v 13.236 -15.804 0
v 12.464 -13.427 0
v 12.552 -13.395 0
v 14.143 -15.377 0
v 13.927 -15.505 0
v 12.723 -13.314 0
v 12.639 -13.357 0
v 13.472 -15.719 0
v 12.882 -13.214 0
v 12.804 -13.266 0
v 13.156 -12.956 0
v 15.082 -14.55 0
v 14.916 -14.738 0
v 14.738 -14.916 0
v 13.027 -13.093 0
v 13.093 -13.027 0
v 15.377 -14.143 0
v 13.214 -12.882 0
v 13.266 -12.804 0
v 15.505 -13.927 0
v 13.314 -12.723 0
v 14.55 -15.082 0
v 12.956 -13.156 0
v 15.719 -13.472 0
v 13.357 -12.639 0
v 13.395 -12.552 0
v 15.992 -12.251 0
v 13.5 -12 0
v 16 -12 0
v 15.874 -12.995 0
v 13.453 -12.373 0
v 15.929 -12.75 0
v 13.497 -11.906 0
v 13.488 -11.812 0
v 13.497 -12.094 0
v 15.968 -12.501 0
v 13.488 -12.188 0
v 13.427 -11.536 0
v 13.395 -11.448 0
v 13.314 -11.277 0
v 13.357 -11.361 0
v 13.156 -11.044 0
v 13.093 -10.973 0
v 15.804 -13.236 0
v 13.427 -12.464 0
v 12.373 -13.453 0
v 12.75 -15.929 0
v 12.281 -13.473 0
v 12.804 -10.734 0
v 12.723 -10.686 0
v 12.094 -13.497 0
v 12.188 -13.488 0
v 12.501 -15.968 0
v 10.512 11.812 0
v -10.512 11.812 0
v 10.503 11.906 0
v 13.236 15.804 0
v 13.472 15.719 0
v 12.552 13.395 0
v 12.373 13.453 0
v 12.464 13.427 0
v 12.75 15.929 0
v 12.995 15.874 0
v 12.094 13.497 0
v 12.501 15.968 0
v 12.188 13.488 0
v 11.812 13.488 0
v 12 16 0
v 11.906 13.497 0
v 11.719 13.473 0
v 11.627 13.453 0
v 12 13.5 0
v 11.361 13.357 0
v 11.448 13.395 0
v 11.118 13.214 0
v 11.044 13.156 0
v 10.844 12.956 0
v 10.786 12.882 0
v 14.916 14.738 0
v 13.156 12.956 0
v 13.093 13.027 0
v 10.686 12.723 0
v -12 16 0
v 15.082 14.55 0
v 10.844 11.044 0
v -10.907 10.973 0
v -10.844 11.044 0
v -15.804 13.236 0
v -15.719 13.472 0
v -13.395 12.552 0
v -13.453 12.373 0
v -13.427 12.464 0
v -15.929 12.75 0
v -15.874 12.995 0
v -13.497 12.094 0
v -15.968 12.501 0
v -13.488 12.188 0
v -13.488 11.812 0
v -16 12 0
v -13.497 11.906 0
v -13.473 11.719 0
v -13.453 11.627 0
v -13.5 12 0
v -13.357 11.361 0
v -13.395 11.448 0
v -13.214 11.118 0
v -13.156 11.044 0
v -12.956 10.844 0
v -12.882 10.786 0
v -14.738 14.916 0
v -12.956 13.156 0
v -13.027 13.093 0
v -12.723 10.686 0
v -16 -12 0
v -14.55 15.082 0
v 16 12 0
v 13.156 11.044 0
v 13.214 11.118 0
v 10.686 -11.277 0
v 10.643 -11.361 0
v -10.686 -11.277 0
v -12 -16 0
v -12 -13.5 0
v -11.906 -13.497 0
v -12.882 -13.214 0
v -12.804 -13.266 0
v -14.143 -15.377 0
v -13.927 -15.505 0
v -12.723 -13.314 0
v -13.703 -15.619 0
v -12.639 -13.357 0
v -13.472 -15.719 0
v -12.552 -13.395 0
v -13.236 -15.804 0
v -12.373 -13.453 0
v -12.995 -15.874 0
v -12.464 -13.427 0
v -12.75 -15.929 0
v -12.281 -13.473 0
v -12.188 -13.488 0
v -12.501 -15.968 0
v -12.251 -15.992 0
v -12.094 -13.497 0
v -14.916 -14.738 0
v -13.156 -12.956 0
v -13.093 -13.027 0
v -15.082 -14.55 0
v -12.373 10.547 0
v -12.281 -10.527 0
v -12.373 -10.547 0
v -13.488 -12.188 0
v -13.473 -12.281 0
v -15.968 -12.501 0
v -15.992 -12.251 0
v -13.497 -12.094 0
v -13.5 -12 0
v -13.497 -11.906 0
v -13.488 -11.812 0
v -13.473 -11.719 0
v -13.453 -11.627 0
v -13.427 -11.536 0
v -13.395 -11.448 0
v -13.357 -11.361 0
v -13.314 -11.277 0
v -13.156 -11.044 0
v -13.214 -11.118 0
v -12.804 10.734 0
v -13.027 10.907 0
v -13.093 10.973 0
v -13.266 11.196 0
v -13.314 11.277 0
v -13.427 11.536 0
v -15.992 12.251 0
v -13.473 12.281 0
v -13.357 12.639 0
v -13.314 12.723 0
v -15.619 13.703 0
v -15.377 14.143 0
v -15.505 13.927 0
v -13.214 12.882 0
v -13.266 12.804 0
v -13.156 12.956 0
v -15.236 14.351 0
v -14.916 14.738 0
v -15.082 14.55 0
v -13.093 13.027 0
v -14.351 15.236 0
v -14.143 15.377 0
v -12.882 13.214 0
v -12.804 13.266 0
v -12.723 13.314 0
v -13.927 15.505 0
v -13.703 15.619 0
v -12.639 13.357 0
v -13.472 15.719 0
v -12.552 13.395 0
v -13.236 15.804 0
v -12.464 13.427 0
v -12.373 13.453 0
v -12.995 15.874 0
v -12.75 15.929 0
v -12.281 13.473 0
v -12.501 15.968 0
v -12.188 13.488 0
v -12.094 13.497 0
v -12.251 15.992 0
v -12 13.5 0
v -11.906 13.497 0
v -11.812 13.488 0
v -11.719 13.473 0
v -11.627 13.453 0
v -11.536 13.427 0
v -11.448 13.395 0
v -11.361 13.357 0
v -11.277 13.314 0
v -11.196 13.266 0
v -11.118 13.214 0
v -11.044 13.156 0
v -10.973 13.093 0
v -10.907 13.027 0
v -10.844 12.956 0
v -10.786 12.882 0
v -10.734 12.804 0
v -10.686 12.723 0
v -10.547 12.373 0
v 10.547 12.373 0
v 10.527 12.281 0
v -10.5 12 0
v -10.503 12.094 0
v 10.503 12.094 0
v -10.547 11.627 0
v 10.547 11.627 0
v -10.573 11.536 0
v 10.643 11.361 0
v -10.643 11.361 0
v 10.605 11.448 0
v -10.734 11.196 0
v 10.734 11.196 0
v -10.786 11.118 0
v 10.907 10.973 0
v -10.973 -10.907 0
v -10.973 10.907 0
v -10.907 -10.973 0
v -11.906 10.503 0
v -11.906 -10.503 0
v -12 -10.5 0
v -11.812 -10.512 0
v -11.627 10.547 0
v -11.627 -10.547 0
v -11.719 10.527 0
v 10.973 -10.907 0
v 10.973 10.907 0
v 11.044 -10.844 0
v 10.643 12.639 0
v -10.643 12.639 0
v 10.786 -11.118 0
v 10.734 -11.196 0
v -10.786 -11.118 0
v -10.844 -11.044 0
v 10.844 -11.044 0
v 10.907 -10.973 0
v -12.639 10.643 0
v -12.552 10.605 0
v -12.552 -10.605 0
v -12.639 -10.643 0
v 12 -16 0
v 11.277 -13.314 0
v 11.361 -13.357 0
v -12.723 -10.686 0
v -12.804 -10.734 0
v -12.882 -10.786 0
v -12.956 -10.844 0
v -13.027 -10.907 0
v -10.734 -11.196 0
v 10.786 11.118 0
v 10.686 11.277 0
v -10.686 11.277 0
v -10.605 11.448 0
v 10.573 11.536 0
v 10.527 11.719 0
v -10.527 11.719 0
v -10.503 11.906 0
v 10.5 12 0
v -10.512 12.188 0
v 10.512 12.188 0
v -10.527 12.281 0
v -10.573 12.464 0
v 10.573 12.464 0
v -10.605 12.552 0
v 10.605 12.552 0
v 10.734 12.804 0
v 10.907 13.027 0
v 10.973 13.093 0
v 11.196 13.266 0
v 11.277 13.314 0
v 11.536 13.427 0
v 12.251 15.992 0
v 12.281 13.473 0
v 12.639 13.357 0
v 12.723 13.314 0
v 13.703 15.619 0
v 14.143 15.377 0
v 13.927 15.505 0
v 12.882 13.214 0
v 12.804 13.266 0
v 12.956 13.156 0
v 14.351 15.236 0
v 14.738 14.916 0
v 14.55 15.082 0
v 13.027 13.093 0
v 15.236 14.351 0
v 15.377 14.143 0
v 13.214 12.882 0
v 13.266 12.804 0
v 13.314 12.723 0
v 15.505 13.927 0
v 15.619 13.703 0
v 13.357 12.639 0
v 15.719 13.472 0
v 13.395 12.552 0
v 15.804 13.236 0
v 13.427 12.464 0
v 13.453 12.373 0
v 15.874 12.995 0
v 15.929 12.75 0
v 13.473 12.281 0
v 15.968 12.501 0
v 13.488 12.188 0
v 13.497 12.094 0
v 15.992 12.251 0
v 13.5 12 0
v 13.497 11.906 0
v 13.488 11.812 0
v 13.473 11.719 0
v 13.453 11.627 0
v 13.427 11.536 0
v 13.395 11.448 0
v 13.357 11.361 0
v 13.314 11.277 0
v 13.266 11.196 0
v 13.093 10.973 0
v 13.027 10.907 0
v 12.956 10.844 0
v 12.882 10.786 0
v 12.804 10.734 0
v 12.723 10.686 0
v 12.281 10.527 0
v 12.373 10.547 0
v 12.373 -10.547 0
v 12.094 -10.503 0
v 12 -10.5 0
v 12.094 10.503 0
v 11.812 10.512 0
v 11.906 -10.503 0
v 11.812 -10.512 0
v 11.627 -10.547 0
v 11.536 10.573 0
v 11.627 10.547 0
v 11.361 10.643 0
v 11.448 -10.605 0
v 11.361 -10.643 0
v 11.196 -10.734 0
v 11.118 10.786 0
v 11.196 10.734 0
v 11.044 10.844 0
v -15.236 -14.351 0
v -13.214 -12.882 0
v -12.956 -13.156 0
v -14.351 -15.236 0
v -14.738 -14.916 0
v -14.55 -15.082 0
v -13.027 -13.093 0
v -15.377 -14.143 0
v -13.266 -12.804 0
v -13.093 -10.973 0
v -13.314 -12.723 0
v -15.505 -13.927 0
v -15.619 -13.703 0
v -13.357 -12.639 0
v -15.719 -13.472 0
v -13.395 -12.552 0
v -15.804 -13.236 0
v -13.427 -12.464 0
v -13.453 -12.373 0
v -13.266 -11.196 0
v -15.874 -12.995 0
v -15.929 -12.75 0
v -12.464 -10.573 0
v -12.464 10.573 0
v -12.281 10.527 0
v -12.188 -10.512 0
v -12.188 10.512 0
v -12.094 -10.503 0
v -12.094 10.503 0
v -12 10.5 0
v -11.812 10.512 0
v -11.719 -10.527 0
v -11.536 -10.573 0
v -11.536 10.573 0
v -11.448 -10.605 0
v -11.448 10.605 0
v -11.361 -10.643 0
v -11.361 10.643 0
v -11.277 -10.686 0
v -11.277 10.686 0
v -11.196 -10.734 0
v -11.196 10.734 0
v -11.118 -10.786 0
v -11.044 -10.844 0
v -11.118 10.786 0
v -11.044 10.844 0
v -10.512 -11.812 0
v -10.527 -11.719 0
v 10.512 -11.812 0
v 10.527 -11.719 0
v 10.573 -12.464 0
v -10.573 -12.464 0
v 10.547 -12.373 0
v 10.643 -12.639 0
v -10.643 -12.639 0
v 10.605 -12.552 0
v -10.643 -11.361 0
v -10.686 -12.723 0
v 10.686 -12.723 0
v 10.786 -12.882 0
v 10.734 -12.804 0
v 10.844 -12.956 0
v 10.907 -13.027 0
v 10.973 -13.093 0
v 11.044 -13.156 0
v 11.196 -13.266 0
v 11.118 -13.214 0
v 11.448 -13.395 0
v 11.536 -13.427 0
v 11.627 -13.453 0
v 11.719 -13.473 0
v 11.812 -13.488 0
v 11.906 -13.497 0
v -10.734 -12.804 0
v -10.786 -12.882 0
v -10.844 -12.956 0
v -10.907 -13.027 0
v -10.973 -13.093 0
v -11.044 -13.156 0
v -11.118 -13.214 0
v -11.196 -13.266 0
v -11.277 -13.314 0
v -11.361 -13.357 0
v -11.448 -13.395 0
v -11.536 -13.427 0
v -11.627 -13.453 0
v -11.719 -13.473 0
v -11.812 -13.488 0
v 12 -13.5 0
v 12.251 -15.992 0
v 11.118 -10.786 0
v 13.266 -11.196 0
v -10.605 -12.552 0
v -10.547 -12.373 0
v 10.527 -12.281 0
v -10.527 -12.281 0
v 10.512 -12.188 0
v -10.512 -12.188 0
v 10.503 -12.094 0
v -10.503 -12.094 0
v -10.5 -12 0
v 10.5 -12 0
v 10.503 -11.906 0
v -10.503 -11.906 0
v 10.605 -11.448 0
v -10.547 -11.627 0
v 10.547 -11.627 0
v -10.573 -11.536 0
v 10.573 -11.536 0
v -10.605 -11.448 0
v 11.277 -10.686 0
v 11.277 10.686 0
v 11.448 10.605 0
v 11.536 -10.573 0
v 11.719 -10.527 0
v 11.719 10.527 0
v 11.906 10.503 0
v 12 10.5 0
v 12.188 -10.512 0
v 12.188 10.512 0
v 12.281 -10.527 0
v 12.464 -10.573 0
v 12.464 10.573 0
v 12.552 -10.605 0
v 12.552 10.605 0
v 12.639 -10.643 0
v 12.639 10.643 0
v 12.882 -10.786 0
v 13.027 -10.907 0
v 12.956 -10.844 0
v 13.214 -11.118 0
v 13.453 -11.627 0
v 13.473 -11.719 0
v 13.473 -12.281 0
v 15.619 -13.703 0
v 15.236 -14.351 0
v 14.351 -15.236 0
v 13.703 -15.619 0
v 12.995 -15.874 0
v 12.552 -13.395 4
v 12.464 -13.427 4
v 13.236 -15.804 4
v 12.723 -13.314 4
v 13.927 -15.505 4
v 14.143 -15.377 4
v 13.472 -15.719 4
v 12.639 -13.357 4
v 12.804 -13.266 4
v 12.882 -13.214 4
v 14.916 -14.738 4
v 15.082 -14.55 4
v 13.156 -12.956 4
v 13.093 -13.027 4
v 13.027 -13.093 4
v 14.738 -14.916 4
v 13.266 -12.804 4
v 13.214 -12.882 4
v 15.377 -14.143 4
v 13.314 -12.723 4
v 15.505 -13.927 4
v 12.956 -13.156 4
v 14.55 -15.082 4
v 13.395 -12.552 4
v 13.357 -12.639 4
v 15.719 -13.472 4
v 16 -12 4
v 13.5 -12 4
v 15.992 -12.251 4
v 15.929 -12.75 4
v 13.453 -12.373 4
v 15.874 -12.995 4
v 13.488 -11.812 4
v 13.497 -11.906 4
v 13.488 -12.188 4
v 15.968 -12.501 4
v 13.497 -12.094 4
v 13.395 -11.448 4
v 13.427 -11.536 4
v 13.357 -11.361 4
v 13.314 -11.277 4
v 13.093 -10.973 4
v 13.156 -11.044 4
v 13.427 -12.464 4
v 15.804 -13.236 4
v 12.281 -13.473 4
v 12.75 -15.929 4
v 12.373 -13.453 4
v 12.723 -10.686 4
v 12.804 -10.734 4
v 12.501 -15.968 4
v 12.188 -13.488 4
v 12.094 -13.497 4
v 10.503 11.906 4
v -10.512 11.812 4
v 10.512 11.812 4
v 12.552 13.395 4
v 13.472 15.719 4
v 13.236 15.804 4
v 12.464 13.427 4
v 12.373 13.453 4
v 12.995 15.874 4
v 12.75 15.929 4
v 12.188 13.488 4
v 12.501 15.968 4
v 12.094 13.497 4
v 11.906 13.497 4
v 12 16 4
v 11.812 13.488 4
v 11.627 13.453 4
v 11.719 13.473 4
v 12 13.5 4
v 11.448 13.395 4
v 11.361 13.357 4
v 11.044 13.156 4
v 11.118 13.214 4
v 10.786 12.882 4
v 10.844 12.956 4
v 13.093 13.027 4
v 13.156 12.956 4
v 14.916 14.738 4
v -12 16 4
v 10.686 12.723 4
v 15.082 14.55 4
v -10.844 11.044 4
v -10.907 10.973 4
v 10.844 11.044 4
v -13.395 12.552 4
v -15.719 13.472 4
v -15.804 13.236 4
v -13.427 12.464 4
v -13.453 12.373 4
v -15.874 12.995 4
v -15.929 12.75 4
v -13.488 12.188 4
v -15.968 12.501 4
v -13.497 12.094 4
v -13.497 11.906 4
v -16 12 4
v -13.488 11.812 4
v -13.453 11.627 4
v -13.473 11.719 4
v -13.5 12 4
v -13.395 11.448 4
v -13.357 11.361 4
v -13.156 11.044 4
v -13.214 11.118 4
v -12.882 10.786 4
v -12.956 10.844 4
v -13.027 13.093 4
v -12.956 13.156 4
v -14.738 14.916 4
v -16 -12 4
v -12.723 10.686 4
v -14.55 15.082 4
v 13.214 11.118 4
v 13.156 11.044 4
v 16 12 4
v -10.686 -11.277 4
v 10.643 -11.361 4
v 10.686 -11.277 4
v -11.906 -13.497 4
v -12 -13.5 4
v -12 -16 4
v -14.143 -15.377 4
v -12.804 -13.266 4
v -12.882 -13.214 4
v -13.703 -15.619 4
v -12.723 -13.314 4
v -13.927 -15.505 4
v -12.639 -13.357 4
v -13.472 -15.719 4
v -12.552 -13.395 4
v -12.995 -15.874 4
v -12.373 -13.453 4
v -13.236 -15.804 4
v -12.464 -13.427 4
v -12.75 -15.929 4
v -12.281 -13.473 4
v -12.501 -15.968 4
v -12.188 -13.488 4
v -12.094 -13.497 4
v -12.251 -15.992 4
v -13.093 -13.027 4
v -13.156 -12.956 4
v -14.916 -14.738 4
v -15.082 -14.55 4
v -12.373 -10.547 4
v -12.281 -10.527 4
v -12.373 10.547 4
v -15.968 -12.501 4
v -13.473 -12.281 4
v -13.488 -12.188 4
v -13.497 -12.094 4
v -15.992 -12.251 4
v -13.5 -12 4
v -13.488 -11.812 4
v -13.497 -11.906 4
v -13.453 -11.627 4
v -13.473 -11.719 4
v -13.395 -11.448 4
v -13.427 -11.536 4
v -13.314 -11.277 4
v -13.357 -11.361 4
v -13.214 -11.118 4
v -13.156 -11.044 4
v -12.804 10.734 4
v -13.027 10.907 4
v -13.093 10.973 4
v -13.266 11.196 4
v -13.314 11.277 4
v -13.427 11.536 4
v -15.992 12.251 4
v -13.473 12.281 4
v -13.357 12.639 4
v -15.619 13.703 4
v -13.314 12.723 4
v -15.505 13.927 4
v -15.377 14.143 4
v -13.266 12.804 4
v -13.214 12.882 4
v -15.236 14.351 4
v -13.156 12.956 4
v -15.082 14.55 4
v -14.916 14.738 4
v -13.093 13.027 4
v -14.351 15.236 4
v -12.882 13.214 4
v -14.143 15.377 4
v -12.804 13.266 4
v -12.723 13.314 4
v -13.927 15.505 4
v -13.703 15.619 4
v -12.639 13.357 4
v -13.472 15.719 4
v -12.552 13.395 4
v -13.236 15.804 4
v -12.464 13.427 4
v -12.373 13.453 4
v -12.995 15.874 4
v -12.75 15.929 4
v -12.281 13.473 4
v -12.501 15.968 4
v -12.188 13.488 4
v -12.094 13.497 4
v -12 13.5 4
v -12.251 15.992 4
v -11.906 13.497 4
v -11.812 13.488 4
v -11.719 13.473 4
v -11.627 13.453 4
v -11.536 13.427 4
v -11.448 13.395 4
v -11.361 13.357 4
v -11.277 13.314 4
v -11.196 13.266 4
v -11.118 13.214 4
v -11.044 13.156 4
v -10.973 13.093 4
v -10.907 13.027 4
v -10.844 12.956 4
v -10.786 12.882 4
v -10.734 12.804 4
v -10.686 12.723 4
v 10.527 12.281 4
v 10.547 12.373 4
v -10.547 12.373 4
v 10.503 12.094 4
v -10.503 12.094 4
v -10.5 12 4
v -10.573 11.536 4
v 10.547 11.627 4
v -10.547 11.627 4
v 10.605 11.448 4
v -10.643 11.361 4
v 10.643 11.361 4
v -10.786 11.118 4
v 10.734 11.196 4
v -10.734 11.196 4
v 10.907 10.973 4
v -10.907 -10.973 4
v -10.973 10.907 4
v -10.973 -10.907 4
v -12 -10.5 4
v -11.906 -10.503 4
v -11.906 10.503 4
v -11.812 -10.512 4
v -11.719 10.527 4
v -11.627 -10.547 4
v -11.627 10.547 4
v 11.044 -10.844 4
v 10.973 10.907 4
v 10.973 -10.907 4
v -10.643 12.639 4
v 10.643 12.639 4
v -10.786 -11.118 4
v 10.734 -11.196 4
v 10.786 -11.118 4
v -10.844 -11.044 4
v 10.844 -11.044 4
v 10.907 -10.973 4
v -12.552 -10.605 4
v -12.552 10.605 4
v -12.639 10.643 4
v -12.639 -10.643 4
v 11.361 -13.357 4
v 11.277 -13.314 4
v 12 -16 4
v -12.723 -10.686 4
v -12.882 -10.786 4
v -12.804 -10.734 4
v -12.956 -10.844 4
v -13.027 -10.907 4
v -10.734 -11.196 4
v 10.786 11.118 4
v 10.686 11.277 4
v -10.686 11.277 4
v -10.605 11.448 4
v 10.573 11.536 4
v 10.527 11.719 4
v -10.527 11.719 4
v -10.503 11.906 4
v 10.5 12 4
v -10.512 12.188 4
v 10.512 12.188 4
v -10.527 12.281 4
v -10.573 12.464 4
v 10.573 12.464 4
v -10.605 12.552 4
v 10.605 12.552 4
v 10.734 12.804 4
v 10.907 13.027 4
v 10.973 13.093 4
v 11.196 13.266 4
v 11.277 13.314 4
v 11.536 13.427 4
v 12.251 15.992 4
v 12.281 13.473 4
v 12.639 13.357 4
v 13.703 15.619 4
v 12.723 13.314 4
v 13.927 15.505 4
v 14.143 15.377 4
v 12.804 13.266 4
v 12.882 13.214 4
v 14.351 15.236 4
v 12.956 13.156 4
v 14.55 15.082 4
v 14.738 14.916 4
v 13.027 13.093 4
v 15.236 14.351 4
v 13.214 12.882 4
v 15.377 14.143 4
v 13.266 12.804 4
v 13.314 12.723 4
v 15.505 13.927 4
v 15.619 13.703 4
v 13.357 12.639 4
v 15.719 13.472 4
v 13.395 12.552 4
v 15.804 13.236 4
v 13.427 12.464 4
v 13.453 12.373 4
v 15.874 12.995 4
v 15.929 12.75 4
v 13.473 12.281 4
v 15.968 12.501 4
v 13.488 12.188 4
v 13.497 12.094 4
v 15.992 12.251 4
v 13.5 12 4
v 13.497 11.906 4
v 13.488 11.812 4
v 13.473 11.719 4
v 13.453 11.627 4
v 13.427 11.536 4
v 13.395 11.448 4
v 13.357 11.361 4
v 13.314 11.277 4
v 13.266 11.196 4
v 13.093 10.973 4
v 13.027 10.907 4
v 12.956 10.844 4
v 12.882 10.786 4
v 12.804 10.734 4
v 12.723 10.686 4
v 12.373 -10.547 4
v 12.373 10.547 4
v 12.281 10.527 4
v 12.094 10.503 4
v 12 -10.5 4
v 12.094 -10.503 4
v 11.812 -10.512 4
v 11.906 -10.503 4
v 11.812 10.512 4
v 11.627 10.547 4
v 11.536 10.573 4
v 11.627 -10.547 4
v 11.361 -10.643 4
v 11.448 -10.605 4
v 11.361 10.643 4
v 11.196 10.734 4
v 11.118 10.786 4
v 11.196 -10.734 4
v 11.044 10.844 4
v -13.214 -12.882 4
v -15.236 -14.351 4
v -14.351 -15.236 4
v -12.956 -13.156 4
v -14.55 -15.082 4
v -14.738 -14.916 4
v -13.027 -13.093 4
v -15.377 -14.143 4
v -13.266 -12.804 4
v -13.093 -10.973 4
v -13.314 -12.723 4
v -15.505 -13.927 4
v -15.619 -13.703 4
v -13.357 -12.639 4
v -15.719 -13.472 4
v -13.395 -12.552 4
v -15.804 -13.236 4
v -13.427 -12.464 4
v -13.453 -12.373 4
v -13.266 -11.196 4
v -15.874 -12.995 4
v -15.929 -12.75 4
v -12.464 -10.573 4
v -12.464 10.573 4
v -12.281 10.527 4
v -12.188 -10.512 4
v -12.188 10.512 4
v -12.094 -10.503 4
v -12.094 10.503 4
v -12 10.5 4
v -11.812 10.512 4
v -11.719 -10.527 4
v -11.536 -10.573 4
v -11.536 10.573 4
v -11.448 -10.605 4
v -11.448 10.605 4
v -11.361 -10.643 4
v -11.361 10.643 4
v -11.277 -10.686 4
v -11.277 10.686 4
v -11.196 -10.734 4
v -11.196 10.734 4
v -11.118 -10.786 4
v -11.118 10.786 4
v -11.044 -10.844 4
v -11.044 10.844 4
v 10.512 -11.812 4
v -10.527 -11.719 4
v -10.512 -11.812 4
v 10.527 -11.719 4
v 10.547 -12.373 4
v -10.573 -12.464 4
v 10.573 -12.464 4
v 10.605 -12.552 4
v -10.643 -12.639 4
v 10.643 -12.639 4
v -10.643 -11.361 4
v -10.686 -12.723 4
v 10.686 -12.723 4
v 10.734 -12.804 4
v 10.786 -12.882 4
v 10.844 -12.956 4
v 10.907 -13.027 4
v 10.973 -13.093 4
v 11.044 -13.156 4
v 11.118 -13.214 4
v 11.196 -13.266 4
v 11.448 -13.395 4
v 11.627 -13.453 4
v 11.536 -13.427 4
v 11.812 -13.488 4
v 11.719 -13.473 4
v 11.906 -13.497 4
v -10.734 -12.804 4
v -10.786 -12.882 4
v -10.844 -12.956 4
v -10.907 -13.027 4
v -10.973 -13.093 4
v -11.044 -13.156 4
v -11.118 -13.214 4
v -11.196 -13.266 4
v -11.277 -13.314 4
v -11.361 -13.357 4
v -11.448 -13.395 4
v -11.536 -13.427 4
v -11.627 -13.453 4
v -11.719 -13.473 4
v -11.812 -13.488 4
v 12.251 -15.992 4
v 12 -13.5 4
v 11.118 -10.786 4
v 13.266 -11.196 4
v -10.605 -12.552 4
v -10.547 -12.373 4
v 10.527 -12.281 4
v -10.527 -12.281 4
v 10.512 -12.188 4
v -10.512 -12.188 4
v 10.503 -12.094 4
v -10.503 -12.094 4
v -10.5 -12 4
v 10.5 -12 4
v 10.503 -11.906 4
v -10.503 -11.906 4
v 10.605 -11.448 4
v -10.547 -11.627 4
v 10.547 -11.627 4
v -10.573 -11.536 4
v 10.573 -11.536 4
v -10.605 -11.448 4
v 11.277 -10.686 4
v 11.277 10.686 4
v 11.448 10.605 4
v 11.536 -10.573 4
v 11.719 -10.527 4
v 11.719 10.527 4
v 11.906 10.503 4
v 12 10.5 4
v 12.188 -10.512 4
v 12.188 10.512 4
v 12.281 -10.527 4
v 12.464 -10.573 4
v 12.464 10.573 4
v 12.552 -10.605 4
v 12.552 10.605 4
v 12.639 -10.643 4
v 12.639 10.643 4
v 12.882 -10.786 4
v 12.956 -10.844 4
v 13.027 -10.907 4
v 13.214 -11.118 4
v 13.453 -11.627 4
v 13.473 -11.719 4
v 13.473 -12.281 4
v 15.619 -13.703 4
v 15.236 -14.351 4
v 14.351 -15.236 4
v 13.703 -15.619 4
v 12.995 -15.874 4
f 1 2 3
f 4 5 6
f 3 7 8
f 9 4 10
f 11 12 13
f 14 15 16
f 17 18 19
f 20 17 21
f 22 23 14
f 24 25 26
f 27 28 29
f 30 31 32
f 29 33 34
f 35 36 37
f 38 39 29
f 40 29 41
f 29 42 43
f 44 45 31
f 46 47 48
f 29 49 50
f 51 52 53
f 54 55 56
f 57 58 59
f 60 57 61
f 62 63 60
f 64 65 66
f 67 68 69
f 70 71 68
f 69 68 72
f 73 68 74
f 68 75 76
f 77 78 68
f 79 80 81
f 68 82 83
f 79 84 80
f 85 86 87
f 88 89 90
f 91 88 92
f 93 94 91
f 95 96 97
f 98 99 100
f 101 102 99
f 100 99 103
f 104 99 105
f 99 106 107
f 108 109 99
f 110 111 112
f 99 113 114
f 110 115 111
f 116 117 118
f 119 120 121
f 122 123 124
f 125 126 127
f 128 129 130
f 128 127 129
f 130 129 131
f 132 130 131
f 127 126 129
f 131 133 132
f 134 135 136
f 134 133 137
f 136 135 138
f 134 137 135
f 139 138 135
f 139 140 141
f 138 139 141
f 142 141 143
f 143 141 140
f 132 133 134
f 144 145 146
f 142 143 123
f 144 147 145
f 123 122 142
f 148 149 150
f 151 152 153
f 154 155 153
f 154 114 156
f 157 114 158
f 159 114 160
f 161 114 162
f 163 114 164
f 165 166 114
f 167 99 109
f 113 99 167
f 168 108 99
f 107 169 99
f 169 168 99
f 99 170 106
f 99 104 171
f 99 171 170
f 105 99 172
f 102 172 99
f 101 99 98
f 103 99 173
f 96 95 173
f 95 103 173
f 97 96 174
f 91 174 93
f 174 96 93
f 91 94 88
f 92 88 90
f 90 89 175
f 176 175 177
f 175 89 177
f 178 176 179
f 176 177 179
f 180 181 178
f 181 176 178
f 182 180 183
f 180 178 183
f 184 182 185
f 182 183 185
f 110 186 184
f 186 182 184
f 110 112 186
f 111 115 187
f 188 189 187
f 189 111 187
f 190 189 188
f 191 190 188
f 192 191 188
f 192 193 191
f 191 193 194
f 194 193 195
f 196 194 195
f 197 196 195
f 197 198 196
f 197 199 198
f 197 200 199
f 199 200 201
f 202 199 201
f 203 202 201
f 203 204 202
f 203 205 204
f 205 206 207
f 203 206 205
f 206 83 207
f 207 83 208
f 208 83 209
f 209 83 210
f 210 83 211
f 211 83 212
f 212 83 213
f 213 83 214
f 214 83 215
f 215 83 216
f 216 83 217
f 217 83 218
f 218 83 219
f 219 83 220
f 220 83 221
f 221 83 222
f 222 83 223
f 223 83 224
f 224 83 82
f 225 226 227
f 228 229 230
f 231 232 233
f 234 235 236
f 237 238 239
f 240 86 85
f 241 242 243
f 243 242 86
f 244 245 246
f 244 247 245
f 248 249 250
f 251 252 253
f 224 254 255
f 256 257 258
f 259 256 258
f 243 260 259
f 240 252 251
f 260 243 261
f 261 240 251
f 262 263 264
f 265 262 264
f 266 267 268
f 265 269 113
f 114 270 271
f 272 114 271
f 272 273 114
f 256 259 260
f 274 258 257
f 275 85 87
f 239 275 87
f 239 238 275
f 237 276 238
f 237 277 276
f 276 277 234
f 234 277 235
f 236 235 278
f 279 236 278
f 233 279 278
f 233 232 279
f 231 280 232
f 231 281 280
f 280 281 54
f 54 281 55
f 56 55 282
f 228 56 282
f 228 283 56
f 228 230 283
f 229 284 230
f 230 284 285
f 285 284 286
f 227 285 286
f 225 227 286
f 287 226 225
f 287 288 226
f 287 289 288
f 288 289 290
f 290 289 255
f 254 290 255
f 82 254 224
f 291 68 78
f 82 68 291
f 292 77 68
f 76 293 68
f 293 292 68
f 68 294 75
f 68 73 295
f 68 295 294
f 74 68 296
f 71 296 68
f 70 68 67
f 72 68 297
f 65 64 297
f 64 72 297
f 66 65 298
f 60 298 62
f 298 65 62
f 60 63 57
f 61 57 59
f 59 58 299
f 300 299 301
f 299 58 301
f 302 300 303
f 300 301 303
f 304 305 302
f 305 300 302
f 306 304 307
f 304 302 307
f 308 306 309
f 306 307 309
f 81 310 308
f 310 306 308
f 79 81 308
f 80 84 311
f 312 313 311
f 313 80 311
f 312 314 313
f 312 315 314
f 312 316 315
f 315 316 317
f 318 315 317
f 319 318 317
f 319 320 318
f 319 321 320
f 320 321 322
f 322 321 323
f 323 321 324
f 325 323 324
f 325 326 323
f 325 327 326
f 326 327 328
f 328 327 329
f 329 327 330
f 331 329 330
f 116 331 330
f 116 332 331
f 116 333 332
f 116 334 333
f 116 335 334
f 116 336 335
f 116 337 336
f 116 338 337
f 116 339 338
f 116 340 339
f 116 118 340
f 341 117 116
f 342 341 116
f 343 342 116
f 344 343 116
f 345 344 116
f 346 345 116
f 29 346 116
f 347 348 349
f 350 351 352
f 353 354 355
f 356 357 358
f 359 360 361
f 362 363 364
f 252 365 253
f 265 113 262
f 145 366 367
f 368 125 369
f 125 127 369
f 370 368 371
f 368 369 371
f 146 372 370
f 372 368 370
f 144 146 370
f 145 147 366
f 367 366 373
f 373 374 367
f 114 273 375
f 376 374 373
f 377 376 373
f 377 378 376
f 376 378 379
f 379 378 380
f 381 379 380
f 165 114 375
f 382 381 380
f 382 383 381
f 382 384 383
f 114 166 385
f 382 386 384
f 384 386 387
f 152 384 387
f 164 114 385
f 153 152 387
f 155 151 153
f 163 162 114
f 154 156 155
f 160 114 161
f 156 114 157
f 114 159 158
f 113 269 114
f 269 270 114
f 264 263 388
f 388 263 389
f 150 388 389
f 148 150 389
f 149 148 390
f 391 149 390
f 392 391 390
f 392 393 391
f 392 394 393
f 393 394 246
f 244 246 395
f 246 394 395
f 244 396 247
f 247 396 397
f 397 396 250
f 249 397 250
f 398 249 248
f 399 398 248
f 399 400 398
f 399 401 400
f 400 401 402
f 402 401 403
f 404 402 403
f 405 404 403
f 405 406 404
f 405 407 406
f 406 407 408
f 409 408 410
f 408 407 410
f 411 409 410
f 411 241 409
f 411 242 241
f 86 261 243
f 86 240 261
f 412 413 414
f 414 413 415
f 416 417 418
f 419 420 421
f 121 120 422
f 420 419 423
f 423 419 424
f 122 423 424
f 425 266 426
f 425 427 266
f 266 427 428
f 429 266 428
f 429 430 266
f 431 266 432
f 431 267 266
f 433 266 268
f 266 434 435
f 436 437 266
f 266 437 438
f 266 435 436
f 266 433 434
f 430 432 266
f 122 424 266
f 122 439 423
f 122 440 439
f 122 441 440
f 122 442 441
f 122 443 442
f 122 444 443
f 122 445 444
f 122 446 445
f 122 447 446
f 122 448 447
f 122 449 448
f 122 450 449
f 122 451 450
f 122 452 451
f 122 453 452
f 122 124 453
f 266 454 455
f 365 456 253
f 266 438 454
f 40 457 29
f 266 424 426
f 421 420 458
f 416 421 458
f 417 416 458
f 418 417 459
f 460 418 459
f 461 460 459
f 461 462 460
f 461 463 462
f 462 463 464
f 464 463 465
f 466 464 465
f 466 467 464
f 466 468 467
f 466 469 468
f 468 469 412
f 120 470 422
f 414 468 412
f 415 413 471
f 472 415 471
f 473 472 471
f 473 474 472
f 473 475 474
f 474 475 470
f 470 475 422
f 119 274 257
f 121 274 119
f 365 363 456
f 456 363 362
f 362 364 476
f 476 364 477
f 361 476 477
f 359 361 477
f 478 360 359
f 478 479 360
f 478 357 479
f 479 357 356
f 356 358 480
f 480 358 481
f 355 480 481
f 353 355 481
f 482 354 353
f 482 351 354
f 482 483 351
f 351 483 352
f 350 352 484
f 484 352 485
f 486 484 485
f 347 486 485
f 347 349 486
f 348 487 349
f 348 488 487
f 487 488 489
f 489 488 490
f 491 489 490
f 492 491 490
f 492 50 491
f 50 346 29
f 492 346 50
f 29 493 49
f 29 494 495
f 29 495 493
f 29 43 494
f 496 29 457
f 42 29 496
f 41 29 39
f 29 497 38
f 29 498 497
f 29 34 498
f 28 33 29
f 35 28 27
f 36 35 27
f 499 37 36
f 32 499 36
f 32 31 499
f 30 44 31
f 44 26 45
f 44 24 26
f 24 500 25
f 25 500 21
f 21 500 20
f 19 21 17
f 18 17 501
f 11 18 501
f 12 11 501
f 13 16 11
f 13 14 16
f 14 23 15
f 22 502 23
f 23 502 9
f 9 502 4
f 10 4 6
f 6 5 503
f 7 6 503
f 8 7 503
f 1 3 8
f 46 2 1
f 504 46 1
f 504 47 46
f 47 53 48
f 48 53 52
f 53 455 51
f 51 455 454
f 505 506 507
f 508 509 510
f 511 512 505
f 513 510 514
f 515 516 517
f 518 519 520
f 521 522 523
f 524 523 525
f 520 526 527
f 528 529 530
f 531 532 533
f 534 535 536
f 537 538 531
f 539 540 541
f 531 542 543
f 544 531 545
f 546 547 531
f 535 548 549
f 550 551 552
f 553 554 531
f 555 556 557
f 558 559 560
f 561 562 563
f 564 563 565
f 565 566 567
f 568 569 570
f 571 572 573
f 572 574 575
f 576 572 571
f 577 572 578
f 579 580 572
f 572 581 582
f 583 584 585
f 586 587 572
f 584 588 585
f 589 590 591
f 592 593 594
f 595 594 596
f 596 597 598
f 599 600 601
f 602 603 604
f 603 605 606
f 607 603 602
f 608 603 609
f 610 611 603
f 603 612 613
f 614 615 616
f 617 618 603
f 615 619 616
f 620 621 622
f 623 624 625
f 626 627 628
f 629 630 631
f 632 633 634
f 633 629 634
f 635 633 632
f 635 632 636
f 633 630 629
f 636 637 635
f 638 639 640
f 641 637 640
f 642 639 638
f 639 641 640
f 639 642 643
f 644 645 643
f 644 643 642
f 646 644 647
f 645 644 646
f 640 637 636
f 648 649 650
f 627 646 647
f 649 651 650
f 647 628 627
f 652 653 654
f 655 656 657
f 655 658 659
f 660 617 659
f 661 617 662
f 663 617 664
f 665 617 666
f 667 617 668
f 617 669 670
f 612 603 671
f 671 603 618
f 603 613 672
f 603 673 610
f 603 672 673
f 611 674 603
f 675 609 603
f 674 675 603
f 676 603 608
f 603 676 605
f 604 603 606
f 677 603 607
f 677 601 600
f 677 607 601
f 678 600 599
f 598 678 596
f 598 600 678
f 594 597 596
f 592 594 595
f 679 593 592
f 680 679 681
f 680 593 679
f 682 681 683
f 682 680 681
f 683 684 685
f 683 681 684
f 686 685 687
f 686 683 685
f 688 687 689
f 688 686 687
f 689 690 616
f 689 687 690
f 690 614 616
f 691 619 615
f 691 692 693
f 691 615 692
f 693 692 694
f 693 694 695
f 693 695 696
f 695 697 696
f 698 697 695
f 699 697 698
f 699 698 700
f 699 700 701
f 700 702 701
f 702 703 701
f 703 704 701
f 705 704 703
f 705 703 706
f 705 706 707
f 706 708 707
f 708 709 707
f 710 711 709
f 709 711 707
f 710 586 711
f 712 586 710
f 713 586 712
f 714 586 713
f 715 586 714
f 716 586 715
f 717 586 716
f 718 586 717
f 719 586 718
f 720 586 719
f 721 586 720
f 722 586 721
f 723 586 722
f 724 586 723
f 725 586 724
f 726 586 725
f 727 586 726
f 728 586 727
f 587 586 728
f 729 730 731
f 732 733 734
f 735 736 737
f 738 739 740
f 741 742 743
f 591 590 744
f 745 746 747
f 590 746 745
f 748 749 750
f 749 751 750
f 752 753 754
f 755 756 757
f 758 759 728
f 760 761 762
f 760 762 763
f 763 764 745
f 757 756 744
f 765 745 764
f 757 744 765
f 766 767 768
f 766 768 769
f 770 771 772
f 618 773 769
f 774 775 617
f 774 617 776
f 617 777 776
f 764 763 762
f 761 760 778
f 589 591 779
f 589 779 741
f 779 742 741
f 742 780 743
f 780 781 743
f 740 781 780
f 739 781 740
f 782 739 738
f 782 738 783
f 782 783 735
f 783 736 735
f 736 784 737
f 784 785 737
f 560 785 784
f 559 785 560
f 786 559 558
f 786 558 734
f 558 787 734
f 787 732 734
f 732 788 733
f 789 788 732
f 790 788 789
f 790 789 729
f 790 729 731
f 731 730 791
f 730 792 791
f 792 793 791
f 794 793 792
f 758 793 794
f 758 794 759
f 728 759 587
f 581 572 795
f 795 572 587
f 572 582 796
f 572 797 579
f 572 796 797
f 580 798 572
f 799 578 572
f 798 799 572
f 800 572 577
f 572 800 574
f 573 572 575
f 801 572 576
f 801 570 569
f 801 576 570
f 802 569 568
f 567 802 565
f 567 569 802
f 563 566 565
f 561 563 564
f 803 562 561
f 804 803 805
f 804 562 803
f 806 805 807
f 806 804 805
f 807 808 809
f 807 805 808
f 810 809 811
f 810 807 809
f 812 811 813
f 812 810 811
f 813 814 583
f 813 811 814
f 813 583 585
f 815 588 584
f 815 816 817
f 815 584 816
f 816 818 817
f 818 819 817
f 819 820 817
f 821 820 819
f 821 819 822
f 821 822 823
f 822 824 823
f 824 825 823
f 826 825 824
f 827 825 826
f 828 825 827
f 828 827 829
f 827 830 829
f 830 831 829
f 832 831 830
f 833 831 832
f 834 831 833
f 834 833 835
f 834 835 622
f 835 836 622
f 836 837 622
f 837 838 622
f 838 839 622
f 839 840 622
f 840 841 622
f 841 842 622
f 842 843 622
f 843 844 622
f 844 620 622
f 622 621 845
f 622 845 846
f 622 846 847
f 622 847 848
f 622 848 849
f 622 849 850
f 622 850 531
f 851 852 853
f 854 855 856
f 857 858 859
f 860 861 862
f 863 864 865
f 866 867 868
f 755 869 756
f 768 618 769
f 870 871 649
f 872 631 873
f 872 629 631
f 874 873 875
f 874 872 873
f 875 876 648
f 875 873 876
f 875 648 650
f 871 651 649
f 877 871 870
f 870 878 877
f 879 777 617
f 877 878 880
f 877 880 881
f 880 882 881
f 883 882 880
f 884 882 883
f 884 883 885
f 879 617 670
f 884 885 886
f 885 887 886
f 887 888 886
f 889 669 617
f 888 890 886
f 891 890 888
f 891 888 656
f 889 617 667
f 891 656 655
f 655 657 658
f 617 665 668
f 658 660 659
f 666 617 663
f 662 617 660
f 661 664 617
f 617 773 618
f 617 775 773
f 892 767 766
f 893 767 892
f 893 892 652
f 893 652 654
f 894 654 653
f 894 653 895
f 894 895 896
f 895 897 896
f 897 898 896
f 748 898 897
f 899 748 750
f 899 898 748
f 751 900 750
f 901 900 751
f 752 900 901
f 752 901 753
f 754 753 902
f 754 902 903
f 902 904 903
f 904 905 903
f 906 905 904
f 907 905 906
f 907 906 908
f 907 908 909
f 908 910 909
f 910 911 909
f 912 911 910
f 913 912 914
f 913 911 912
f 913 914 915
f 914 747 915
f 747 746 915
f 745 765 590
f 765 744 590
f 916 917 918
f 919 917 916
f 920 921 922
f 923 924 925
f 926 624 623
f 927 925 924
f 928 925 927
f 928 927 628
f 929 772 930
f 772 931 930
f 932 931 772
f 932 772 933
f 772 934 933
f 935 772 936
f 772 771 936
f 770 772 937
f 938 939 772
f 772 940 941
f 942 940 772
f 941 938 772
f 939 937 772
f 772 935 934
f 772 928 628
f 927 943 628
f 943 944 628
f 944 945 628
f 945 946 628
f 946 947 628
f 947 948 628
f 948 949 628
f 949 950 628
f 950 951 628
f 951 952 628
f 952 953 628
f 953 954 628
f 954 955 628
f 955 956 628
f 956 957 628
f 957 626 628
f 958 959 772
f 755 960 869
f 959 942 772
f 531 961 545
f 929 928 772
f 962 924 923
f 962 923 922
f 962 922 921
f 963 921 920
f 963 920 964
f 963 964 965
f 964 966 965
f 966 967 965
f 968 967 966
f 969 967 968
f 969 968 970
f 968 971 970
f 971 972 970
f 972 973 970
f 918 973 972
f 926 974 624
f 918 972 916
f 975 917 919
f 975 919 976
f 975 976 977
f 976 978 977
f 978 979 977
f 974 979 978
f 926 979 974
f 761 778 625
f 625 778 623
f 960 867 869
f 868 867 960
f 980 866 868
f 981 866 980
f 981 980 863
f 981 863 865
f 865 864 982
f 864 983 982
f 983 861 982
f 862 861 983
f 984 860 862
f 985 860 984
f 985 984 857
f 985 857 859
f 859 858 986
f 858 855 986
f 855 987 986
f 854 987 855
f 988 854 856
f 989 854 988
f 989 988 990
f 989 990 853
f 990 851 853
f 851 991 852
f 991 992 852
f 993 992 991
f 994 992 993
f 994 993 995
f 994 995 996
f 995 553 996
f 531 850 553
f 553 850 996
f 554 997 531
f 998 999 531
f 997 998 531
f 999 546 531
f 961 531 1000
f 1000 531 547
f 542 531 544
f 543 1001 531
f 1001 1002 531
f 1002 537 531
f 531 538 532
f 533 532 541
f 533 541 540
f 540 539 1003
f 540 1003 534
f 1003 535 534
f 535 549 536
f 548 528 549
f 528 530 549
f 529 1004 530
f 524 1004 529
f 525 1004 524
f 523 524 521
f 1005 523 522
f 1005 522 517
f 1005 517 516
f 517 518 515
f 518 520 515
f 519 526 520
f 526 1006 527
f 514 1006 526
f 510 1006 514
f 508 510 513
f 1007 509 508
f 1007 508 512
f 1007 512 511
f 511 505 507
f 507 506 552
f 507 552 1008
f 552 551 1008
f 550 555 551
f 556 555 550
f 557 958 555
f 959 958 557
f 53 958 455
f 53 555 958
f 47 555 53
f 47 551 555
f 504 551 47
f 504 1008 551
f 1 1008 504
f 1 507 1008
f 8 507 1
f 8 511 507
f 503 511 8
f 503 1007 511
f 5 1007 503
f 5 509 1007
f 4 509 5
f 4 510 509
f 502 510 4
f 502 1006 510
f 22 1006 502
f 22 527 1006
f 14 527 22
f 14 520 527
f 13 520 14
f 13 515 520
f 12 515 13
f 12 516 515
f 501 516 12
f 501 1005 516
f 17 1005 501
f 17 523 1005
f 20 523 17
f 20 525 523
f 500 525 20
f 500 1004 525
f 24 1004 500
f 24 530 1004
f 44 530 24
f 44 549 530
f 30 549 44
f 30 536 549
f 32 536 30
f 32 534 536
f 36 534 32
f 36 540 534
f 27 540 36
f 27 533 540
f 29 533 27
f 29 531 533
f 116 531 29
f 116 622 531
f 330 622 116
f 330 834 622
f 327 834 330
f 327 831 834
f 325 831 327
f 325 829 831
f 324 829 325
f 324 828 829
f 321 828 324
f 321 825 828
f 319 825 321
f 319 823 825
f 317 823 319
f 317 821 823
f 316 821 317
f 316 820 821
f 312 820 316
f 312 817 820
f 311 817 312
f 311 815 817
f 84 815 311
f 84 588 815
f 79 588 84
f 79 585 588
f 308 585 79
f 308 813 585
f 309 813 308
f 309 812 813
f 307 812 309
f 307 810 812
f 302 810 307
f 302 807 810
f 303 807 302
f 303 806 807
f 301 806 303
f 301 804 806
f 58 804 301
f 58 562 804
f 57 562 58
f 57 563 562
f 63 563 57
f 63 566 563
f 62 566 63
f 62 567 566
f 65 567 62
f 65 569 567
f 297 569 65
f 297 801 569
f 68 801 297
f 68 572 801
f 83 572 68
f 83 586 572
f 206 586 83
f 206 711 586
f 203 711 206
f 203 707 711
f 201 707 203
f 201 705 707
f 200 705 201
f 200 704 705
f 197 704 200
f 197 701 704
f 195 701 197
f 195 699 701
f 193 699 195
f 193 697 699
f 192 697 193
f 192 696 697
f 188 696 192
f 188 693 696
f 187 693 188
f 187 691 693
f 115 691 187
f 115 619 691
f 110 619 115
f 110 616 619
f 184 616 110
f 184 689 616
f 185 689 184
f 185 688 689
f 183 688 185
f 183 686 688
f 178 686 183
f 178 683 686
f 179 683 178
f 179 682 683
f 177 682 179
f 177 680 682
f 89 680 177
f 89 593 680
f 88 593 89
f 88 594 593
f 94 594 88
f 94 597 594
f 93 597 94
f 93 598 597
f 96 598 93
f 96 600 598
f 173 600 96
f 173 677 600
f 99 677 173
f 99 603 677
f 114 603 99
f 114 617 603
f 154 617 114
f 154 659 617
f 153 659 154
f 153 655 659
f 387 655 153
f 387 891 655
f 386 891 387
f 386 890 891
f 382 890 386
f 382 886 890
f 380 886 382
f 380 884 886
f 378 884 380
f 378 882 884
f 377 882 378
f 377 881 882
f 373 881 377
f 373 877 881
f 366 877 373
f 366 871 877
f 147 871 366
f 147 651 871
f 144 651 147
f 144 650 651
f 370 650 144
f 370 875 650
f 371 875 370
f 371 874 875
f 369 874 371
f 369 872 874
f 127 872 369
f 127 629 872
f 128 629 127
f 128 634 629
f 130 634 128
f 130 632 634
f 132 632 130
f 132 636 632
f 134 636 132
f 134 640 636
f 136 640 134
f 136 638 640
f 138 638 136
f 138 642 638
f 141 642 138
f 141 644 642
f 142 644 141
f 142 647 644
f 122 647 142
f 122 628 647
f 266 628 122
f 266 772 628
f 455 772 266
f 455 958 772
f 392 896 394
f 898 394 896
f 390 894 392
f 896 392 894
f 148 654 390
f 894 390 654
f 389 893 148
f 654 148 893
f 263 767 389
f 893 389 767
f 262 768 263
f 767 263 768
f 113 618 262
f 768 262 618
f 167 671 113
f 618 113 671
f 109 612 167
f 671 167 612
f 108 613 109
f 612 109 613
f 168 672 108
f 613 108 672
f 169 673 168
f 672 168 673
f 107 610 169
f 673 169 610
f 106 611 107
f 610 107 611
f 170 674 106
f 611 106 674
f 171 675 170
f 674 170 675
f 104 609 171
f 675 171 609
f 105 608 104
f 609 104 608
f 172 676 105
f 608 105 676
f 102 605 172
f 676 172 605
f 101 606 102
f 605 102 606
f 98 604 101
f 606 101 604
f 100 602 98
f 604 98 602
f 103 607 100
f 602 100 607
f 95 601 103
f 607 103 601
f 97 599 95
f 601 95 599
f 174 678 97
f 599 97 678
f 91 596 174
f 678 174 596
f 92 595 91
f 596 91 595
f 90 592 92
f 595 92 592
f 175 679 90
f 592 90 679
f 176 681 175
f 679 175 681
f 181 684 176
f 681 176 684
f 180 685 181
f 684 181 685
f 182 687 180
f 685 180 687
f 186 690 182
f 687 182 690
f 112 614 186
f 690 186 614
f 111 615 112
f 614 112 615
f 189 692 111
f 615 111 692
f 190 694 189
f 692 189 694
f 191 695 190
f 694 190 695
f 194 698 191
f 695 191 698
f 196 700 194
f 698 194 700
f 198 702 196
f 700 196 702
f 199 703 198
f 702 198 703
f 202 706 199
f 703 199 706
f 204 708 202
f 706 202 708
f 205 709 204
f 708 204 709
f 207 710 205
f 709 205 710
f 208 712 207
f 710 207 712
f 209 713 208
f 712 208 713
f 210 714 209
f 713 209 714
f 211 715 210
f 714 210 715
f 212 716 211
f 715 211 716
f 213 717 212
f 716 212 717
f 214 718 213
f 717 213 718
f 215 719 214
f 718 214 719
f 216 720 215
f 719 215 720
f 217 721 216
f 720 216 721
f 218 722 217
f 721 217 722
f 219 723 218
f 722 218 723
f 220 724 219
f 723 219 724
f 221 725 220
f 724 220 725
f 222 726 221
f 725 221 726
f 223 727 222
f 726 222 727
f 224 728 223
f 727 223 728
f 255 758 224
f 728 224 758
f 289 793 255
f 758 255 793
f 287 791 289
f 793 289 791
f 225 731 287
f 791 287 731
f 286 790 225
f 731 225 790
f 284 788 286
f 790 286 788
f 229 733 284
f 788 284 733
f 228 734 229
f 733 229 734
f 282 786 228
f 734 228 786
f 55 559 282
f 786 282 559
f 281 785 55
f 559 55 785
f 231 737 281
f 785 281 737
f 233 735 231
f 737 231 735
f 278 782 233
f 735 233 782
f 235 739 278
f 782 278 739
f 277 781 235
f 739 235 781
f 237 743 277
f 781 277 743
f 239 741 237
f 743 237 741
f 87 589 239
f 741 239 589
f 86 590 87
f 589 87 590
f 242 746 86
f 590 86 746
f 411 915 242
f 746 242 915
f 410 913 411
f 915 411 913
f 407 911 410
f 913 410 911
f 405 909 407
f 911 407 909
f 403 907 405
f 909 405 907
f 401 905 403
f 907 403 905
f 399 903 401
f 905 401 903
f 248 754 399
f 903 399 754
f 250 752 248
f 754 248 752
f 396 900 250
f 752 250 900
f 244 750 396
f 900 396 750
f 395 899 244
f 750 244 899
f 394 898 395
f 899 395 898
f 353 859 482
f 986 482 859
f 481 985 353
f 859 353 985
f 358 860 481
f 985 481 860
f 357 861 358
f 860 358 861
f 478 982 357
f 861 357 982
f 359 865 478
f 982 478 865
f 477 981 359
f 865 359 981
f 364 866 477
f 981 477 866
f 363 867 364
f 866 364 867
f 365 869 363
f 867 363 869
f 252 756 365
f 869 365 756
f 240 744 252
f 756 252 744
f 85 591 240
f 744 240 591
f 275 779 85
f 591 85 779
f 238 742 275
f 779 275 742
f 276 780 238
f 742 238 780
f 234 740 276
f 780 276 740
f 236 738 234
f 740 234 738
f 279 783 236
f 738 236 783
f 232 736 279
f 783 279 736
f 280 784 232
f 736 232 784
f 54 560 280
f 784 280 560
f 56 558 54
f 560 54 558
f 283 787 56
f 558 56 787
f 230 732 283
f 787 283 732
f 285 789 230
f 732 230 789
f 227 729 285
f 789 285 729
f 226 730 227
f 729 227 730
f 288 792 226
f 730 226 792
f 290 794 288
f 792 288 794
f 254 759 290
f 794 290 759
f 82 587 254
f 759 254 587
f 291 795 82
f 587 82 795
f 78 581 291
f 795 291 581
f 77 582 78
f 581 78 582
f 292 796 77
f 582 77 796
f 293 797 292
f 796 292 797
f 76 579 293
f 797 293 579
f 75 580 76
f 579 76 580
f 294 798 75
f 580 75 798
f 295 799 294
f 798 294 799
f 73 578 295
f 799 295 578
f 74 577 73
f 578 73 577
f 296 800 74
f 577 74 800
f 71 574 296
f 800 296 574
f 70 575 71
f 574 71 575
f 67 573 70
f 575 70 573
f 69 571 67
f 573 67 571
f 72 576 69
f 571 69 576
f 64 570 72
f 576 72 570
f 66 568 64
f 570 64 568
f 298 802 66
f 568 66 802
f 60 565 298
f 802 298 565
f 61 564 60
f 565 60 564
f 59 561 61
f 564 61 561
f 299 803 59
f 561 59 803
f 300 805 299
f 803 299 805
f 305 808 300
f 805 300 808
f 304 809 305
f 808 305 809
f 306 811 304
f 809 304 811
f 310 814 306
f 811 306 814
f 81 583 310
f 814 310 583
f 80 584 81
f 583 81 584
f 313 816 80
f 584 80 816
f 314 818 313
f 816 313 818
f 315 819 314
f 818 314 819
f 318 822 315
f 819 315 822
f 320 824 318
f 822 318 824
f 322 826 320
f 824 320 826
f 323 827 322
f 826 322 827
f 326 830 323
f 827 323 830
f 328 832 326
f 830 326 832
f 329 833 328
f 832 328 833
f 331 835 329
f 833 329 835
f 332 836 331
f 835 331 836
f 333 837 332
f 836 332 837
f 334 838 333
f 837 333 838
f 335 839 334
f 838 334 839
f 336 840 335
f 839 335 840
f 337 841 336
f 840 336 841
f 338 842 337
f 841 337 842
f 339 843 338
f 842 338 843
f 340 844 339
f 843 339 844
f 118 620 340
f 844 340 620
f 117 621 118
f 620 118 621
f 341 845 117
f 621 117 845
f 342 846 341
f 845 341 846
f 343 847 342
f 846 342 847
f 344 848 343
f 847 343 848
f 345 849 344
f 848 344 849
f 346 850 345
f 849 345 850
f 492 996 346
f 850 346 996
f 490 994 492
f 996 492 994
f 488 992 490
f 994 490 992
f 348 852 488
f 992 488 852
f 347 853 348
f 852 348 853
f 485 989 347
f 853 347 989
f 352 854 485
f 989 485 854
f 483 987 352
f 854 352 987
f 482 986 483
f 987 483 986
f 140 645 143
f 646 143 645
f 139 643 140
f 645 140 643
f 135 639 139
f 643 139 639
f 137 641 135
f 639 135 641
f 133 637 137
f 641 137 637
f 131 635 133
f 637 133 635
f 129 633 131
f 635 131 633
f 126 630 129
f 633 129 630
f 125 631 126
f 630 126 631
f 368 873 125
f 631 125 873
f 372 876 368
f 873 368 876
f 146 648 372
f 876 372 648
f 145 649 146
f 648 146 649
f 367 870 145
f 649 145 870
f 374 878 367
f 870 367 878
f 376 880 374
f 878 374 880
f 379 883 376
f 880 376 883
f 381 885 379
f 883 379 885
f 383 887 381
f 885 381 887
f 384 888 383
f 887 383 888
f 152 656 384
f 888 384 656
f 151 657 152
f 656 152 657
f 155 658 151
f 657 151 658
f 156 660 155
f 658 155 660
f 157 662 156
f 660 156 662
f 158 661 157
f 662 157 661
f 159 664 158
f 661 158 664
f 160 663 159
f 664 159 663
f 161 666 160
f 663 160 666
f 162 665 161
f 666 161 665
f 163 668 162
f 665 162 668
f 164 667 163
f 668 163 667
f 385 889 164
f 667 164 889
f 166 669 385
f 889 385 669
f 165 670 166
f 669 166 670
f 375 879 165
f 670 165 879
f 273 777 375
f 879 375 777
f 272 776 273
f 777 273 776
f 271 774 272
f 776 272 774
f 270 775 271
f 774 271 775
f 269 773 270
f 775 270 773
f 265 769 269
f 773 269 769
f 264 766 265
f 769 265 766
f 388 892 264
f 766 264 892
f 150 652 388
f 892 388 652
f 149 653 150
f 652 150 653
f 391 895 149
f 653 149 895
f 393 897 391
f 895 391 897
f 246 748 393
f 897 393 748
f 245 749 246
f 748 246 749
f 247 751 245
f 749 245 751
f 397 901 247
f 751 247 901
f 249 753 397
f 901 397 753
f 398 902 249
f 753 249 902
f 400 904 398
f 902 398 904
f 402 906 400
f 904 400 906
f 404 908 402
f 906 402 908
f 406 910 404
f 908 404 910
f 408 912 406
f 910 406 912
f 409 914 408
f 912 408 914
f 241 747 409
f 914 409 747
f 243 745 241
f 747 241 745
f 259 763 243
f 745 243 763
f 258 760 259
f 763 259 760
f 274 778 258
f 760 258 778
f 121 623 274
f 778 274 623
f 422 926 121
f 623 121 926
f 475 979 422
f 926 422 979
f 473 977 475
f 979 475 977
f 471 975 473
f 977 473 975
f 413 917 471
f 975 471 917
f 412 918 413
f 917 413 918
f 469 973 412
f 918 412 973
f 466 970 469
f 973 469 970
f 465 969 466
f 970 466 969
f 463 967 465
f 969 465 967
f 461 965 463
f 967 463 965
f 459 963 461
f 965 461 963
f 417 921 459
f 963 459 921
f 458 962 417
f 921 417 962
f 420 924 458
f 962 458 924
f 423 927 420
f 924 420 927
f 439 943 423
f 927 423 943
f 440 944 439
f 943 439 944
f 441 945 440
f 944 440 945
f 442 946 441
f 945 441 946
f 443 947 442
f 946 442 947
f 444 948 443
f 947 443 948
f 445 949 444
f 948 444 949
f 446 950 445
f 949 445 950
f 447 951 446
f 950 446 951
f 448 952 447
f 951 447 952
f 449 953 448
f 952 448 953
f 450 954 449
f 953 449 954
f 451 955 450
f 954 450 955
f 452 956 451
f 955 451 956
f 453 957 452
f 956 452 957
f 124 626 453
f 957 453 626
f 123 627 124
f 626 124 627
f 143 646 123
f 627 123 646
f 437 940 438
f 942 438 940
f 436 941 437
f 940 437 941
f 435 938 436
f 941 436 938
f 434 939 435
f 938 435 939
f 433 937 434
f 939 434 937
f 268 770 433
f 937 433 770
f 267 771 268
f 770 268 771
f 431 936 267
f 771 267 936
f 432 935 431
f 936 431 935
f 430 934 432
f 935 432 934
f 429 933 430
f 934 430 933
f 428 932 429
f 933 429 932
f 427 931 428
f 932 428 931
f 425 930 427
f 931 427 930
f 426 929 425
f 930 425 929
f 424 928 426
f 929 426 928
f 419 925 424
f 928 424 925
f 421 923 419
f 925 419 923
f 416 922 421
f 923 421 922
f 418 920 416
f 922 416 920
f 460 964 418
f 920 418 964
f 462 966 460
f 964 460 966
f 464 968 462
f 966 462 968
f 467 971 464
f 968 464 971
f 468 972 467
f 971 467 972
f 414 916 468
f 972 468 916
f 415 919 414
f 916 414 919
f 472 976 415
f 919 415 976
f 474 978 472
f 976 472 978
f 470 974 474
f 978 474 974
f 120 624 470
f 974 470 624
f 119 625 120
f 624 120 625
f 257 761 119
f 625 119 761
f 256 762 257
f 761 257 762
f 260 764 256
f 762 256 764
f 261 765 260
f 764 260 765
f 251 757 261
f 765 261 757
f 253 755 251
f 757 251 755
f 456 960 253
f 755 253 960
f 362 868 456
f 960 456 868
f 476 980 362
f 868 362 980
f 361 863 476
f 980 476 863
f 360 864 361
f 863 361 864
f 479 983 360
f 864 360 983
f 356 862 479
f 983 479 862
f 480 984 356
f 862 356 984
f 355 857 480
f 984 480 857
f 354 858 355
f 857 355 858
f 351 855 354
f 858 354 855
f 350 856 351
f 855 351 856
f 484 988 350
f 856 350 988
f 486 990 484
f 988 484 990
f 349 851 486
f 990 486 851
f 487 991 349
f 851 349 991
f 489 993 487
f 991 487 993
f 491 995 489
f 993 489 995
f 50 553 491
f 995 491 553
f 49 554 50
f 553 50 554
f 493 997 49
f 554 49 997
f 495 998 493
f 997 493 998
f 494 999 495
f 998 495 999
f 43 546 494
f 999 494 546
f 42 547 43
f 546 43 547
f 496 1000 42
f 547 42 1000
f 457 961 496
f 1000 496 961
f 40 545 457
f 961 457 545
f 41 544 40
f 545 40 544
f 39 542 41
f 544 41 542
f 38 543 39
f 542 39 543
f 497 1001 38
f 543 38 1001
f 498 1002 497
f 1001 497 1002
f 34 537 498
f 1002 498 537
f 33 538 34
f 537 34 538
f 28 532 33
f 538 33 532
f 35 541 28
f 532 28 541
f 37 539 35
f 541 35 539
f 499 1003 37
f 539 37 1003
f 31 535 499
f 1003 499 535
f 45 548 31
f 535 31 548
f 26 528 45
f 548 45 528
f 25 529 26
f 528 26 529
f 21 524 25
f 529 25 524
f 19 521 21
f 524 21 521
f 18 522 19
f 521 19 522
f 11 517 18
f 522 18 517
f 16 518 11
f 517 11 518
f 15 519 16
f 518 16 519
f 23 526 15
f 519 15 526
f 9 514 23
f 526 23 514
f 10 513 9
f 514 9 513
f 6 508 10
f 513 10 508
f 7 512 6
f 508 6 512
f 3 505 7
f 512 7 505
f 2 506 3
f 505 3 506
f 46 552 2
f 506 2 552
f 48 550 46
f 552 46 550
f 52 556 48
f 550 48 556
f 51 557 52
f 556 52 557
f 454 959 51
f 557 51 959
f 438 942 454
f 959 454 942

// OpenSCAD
// file: ../scad_libs/variables.scad
function _(a,k) = [
    for(i=[0:2:len(a)-2]) if(a[i]==k) a[i+1]
][0];


function c(k) = _(c,k);
c = [
    "t", 2,     //thickness
    "ts", 3.5,  //thickness structural
    "tmin", 1,  //minimum thickness
    "g", 0.065,  //gap
    "gs", 0.07  //gap smooth
];

function screw(k) = _(screw,k);
screw = [
    "d", 3,     //diameter
    "l", 12,    //long length
    "s", 7      //short length
];
// file: ../scad_libs/parts.scad
$fn = 100;

use <utils.scad>

module tslot(l) {
    linear_extrude(height=r) {
        
    }
}


module sensormount(hole = 4.33)  {
    translate([-12,-12,0])
    difference() {
        round_2d(4) square(24);
        
        for (x = [0,24]) for (y = [0,24]) translate([x,y,0]) circle(hole/2);
    }
}

module tslot() { import("resources/tslot.dxf"); }
// file: ../scad_libs/utils.scad
$fn = 100;

module round(r) { minkowski() {
    sphere(r);
    children();
} }
module round_2d(r) { minkowski() {
    circle(r);
    children();
} }
// main file
use <../scad_libs/utils.scad>
use <../scad_libs/parts.scad>
use <../scad_libs/variables.scad>



legs = [true, true, true, true];

linear_extrude(height = 4) sensormount(hole = 3);

rotate([180,0,0]) linear_extrude(height = 15) {
    for(i = [0:90:360]) rotate([0,0,i]) translate([-12.7,0,0]) tslot();
}
